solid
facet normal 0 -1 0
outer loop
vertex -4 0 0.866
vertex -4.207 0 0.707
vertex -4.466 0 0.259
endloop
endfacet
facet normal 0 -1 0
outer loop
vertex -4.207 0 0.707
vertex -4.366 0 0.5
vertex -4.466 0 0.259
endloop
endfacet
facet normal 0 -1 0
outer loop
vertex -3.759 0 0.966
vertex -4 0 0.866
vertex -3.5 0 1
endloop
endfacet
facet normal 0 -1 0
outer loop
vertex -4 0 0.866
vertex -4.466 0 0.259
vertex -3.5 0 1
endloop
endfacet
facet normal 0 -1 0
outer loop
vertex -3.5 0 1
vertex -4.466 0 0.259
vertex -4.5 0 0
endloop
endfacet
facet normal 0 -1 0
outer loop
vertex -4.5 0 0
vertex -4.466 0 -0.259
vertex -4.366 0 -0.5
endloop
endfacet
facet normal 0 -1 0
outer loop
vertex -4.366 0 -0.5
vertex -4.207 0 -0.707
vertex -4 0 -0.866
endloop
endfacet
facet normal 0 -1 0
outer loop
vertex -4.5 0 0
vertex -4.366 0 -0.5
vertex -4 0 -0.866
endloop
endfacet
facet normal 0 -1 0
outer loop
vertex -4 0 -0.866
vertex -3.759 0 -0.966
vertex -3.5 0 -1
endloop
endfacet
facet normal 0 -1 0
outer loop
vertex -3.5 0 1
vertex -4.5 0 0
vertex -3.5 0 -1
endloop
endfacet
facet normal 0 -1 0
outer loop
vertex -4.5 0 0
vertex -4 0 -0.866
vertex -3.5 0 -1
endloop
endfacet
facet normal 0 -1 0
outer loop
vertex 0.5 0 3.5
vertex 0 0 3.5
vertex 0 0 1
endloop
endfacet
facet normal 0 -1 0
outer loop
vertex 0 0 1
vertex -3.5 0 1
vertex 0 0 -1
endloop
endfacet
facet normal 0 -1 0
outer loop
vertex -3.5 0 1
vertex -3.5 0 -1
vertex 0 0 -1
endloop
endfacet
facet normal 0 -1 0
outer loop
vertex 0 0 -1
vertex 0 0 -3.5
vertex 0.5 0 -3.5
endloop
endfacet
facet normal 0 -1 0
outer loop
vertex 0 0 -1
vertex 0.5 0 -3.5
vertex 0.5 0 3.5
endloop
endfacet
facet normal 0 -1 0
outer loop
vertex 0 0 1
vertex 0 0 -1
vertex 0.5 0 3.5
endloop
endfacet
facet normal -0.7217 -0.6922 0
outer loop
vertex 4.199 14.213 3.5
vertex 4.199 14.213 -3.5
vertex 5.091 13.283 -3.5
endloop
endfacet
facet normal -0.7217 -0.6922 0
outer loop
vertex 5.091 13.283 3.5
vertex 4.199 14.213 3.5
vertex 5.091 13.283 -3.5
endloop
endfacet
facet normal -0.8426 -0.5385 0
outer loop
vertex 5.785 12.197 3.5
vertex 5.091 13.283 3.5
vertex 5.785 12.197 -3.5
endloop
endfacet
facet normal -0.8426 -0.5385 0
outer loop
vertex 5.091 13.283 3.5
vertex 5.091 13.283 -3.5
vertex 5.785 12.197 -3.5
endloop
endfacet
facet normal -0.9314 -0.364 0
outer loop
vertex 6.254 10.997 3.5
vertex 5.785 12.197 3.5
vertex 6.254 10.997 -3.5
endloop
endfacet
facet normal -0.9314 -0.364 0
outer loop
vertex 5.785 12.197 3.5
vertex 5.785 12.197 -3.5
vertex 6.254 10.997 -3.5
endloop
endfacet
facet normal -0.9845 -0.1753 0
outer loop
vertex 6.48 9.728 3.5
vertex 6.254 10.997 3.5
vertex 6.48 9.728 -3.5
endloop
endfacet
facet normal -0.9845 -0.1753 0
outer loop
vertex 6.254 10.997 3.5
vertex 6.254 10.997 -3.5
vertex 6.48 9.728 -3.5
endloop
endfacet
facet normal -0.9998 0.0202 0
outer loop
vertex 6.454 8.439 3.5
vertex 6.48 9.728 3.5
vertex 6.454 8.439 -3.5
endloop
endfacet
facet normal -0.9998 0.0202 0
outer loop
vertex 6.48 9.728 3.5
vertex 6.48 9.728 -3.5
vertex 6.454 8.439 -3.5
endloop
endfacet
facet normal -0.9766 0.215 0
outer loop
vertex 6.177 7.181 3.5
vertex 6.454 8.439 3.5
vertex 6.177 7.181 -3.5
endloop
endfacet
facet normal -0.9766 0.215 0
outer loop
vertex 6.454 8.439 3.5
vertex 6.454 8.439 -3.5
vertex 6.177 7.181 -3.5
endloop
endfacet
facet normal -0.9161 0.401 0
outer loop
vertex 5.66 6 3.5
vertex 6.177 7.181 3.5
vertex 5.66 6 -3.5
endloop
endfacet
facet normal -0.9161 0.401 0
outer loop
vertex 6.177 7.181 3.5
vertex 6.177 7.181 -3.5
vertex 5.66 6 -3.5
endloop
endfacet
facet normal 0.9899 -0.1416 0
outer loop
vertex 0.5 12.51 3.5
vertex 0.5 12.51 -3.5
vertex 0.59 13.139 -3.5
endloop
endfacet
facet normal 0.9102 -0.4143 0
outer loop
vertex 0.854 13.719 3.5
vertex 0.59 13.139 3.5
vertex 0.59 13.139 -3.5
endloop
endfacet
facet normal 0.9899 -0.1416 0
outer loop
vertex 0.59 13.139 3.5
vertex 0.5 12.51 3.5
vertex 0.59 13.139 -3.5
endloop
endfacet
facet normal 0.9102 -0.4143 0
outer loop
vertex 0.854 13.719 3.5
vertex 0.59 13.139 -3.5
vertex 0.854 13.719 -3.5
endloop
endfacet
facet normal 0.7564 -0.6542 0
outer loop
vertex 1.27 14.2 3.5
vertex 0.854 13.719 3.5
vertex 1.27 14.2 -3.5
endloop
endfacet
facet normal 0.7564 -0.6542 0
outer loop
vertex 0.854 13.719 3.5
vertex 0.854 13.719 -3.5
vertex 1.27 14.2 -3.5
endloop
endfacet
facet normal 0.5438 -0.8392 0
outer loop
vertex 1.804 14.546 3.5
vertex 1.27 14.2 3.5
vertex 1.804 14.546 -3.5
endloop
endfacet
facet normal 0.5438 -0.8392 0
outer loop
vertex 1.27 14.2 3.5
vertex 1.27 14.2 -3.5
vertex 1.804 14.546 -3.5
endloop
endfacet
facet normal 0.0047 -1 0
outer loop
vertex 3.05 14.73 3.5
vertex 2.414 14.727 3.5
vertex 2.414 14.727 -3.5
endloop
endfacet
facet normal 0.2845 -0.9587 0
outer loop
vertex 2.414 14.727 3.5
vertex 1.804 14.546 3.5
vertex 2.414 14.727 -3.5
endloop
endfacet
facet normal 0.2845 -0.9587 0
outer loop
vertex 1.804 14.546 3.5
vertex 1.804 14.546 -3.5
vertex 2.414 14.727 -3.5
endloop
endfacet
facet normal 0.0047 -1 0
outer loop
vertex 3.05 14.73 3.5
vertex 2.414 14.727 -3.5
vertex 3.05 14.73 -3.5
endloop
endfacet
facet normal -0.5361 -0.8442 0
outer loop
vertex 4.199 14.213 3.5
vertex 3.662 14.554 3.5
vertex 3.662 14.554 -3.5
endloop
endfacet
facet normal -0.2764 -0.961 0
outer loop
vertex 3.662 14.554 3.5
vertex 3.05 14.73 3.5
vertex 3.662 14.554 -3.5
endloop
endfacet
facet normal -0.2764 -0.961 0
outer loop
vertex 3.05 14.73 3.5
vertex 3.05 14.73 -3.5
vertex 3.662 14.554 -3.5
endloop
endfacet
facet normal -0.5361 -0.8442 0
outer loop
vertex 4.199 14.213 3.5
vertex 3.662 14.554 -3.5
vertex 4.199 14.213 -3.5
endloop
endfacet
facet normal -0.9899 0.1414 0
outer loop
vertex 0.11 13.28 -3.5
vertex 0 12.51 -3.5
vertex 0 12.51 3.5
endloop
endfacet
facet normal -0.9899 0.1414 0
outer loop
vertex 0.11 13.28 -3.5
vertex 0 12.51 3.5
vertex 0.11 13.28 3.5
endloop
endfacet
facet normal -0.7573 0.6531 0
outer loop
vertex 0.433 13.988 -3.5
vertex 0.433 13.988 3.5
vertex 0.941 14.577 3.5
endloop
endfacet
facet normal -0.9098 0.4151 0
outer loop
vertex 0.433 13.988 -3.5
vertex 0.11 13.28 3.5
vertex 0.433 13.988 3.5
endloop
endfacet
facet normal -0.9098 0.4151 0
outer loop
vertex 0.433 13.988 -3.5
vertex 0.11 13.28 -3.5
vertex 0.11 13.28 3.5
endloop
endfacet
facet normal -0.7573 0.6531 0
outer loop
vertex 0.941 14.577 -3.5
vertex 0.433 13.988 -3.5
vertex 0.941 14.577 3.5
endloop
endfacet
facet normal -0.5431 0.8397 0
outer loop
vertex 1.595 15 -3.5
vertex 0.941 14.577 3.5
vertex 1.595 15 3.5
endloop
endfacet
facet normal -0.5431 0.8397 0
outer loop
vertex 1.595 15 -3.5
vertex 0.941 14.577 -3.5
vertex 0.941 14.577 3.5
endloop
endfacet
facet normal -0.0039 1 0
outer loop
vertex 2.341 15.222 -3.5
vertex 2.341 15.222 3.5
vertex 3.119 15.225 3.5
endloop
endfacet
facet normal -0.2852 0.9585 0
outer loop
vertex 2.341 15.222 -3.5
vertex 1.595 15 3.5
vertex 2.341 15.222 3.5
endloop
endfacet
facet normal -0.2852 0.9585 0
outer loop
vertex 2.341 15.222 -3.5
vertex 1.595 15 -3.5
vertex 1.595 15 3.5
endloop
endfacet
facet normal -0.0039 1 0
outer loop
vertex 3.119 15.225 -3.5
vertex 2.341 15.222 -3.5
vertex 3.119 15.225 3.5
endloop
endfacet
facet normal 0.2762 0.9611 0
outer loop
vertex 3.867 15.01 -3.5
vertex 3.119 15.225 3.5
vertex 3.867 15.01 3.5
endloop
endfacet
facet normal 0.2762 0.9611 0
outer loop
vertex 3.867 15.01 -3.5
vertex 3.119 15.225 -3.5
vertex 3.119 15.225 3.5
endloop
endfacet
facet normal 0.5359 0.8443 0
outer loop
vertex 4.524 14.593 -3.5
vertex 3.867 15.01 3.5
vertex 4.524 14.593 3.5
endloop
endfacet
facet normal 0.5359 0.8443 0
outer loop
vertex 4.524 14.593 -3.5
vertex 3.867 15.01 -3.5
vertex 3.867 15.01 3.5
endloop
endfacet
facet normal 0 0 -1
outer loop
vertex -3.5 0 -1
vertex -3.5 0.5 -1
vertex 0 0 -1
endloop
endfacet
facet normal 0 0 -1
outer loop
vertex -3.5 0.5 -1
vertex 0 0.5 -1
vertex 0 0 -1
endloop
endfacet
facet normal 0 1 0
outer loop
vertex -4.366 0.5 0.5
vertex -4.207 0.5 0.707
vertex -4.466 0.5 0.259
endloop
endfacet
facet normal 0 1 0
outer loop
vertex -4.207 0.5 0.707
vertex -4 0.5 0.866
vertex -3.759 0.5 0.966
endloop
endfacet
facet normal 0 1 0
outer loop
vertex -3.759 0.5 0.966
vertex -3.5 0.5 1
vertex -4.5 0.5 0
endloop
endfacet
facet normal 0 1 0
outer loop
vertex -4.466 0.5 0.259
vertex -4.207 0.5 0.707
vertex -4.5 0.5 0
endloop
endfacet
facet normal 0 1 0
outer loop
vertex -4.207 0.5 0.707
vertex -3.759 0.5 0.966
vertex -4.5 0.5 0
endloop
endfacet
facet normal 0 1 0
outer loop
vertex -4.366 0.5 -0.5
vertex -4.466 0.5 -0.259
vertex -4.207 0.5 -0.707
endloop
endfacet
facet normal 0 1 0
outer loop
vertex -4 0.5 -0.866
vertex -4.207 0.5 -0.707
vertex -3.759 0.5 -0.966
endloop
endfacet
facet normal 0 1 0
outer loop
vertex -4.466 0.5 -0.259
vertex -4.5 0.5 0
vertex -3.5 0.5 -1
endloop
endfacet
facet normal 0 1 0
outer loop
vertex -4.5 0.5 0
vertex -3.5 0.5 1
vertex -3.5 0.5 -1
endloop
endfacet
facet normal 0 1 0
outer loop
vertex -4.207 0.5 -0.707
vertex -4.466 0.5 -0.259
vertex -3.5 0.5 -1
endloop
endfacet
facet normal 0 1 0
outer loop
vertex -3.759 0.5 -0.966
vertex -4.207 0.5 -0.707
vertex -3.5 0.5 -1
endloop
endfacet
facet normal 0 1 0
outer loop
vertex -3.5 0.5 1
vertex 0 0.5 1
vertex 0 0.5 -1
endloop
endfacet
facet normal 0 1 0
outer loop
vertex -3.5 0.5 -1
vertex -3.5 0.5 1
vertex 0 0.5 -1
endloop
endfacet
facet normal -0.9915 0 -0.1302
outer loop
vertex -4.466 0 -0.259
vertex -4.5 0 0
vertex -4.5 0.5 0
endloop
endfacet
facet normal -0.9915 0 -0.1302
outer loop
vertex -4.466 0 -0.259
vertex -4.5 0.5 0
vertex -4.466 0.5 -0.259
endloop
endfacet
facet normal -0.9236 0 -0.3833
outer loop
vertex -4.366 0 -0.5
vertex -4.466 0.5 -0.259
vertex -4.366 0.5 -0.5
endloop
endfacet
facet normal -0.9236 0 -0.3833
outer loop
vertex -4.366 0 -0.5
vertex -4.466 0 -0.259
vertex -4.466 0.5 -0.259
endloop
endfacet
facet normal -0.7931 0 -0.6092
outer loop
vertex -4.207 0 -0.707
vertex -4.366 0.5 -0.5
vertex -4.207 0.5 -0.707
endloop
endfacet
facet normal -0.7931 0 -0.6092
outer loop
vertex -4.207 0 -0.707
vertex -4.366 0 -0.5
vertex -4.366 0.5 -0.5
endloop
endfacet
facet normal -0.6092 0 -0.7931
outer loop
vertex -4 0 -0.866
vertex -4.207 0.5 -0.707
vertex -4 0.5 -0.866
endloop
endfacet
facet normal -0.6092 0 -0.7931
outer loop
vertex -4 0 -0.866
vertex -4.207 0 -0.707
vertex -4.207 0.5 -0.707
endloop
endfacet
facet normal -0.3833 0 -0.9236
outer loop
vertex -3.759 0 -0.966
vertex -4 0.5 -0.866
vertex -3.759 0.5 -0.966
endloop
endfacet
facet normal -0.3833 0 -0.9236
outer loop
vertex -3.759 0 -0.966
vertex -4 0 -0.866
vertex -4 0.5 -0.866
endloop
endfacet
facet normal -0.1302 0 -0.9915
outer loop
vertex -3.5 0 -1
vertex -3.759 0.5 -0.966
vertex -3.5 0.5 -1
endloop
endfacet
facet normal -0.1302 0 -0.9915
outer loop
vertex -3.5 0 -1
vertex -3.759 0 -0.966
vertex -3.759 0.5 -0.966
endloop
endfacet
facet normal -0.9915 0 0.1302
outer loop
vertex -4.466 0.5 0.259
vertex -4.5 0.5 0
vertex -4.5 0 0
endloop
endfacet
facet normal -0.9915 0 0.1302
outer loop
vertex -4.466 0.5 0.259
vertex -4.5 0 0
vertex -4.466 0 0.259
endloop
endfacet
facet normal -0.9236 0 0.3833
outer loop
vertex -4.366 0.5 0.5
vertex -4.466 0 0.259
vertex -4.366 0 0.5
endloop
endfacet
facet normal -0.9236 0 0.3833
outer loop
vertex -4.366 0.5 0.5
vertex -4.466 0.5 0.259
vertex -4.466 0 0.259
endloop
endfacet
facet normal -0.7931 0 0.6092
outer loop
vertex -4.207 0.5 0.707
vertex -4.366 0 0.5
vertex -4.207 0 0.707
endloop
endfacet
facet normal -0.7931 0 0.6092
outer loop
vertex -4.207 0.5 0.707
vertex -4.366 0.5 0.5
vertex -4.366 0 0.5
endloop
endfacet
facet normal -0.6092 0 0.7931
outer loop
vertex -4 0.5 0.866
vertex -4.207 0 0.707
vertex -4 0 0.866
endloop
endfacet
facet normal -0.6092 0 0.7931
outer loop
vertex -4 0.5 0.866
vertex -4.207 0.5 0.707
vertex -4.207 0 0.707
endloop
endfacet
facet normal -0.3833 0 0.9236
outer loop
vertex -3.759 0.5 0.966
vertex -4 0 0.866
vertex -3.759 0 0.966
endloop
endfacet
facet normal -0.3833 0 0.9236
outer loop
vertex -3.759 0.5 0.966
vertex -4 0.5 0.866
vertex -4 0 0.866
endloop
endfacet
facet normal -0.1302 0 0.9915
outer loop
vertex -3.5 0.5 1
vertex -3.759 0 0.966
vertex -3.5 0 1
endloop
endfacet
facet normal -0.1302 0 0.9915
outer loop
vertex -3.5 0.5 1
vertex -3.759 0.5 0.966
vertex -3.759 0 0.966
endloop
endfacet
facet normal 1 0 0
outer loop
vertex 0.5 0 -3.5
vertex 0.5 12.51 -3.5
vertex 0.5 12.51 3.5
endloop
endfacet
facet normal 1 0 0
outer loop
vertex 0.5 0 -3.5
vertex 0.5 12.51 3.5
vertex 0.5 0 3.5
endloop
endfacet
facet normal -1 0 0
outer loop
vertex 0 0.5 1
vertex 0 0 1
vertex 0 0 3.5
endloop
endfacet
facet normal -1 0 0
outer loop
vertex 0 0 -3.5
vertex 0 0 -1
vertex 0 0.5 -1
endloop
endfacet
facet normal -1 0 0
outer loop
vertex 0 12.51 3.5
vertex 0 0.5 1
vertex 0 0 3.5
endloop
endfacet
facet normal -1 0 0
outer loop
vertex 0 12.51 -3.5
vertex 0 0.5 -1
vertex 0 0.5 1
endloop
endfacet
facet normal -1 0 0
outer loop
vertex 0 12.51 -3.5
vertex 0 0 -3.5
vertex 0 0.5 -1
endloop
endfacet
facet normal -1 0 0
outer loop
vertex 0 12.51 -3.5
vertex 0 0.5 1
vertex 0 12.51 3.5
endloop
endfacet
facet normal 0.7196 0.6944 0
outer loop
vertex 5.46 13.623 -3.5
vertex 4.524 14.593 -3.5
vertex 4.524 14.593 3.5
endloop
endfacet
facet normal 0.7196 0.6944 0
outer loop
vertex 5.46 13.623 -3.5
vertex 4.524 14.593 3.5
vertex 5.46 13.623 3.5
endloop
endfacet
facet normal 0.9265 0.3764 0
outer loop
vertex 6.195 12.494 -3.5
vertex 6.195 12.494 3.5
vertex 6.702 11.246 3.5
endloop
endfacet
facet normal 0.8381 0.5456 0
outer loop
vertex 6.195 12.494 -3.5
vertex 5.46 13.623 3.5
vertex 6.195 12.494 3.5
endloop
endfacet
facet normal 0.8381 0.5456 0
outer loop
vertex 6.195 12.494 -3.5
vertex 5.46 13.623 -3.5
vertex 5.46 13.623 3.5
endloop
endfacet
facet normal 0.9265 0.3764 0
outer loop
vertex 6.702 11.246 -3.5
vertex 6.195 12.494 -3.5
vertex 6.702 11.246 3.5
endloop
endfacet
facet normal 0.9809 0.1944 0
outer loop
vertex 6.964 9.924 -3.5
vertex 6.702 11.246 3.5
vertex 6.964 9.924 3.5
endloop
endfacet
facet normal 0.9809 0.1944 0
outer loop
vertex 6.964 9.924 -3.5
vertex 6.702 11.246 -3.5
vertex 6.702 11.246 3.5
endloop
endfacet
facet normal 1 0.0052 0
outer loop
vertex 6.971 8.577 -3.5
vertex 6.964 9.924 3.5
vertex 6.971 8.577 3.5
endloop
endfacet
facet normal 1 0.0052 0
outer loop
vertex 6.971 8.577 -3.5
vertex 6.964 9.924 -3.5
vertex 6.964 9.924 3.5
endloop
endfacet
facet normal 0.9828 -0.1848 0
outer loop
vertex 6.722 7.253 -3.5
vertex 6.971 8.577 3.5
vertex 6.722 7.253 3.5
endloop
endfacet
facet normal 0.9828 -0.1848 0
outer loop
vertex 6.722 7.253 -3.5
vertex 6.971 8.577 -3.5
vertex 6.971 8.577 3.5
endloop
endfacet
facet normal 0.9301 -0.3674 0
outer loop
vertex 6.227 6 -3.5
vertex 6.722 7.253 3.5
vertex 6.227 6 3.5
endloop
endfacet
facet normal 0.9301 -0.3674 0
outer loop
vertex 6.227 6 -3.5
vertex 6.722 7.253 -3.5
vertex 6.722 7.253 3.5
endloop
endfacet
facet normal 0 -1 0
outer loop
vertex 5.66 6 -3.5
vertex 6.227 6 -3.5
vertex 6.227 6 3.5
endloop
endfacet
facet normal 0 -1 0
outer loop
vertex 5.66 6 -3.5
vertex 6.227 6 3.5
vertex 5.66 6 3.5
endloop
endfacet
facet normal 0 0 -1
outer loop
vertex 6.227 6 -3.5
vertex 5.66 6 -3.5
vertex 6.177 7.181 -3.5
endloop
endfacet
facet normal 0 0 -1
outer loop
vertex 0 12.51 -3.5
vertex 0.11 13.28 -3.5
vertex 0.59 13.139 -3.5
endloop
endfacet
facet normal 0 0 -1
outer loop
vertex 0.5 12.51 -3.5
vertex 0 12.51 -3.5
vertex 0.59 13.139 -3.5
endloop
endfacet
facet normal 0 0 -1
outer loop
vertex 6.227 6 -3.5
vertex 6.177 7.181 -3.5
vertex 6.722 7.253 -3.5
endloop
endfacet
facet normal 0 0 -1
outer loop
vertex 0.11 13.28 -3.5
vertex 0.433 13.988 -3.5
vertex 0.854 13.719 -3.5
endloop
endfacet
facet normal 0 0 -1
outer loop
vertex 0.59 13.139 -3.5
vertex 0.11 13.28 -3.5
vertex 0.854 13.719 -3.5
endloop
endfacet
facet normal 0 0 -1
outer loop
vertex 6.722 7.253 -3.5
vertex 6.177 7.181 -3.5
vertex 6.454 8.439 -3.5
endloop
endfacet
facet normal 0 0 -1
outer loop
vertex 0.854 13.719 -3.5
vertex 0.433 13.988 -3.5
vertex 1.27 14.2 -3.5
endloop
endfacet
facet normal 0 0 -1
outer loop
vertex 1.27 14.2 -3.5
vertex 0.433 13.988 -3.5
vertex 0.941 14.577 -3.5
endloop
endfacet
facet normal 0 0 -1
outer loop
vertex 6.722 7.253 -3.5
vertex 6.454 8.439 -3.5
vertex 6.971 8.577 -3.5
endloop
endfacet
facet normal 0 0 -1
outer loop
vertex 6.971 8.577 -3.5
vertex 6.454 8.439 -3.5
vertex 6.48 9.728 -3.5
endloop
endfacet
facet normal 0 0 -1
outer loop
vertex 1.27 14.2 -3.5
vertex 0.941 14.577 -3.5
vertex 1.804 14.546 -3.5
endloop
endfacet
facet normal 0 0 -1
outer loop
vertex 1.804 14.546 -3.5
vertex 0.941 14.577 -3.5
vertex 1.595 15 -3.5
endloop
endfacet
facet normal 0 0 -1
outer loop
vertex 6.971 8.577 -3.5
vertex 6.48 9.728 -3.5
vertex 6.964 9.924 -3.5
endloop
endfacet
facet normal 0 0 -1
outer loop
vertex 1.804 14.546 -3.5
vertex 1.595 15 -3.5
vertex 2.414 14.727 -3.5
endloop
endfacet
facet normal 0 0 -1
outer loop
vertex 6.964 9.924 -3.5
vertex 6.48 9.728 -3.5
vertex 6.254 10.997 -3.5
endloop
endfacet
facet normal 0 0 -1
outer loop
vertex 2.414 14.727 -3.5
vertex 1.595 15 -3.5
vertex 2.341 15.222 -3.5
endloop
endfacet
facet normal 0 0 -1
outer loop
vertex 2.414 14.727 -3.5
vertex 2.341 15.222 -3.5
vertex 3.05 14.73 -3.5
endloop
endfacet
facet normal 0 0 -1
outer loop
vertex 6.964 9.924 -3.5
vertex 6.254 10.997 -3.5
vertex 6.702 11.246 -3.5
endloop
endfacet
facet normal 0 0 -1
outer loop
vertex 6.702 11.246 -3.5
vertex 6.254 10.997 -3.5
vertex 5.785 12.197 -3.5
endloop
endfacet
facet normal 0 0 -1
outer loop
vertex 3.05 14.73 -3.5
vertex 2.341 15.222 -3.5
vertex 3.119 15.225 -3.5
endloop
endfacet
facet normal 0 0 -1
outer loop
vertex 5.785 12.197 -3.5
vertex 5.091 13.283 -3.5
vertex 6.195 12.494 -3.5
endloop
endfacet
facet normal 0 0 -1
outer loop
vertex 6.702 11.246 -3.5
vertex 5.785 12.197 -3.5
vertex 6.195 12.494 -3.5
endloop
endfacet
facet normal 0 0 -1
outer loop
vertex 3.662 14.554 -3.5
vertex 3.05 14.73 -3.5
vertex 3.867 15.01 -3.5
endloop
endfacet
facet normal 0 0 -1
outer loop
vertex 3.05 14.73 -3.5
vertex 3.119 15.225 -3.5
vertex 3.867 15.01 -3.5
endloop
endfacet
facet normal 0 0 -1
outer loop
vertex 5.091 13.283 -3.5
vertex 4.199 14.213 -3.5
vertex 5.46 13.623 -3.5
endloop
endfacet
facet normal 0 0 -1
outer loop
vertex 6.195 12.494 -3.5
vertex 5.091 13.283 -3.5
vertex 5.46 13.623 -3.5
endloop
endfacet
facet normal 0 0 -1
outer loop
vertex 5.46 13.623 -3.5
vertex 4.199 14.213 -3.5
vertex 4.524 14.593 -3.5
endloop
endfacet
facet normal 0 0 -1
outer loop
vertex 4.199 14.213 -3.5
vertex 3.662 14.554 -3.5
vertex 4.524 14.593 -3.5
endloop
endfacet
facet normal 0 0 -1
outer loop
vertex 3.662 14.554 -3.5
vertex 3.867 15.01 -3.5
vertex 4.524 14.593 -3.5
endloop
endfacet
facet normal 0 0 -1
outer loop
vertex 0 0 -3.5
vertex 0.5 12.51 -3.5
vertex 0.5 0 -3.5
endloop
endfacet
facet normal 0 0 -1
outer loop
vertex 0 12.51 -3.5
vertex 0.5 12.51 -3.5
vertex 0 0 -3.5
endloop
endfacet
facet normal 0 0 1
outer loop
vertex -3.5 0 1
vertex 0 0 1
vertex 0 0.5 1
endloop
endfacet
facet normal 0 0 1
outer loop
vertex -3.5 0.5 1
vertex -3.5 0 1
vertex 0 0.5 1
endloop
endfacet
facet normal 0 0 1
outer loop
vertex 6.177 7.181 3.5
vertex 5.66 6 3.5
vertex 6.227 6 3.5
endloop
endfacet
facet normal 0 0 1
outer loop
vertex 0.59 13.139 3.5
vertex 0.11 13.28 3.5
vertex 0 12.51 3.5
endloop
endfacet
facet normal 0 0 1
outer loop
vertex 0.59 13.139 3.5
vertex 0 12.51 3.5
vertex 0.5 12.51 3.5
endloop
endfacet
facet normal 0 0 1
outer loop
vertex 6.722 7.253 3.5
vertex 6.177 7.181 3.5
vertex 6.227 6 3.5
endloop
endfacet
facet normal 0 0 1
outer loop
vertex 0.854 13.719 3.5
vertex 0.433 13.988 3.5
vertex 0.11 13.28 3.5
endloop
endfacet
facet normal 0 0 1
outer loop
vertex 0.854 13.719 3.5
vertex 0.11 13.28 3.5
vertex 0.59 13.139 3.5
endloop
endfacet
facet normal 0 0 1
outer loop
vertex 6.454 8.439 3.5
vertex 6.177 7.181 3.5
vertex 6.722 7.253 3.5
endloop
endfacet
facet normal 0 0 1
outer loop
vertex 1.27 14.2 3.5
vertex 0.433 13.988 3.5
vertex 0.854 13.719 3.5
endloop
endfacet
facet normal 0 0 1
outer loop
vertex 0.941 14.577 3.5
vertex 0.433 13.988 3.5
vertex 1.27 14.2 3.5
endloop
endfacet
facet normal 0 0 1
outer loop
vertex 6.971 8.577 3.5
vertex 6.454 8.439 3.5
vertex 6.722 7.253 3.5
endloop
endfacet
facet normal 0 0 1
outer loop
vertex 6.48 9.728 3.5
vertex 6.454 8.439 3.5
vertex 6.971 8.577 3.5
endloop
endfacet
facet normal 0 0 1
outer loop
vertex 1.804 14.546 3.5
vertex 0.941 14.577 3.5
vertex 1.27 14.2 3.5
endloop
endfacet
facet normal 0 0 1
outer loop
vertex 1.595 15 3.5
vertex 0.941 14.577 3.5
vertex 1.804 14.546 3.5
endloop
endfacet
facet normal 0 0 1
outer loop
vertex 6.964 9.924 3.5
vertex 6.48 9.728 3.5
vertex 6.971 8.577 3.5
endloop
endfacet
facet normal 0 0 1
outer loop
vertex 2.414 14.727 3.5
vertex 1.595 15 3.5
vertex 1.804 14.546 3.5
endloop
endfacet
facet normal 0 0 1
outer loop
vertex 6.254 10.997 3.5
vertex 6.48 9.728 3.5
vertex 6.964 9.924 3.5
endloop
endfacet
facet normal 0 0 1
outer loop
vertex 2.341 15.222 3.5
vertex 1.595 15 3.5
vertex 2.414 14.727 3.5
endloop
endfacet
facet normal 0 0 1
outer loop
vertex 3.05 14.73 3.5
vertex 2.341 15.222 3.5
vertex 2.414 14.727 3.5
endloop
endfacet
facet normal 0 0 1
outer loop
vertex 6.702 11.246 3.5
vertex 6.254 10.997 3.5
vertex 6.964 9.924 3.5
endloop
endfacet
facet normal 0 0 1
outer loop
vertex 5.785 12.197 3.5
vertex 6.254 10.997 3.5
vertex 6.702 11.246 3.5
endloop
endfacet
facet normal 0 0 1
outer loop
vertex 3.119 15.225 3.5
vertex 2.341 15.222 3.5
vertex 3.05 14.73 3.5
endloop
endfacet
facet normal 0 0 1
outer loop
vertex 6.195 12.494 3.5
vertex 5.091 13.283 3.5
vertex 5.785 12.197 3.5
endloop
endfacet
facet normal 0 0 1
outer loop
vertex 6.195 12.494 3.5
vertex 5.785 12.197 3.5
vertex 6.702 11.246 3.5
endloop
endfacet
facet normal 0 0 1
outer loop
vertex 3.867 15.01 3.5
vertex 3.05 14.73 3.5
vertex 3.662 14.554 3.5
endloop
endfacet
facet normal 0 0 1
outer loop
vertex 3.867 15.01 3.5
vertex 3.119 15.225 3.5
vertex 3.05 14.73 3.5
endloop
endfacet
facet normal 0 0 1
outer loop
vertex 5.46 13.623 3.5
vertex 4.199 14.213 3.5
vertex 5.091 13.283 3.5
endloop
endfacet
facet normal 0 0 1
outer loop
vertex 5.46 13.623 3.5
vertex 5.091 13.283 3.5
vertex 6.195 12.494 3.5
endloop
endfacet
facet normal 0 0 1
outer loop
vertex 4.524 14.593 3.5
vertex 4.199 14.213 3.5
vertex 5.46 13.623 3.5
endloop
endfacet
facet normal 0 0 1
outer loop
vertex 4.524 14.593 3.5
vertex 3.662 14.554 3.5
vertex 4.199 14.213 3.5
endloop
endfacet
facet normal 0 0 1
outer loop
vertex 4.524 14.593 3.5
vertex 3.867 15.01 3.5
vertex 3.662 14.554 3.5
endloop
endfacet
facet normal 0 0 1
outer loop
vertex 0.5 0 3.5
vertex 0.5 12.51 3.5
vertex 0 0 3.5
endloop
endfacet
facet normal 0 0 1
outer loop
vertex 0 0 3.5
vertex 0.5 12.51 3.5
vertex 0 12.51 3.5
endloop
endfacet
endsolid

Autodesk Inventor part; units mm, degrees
ref_plane "YZ Plane" through (0, 0, 0) normal (1, 0, 0) x (0, 1, 0)
ref_plane "XZ Plane" through (0, 0, 0) normal (0, 1, 0) x (-1, 0, 0)
ref_plane "XY Plane" through (0, 0, 0) normal (0, 0, 1) x (1, 0, 0)
sketch "Sketch1" plane through (0, 0, 0) normal (0, 0, 1) x (1, 0, 0)
  line L0 (0, 0) -> (0, 12.5096)
  arc A0 (4.5242, 14.5927) -> (0, 12.5096) centre (2.7416, 12.5096) ccw
  arc A1 (6.2274, 6) -> (4.5242, 14.5927) centre (-0.0774, 9.2154) ccw
  line L1 (6.2274, 6) -> (5.6605, 6)
  arc A2 (5.6605, 6) -> (4.1991, 14.2128) centre (-0.0774, 9.2154) ccw
  arc A3 (4.1991, 14.2128) -> (0.5, 12.5096) centre (2.7416, 12.5096) ccw
  line L2 (0.5, 12.5096) -> (0.5, 0)
  line L3 (0, 0) -> (0.5, 0)
  line L4 (7, 9.2154) -> (7, 0)
  point P0 (0.25, 0)
  point P1 (1.595, 15)
  point P2 (5.9439, 6)
  point P3 (6.8649, 10.5915)
  dimension "d0" = 0.5
  dimension "d1" = 15
  dimension "d2" = 6
  dimension "d4" = 7
extrude "Extrusion1" add sketch "Sketch1" along normal mid plane 7
sketch "Sketch2" plane through (0, 0, -3.5) normal (-1, 0, 0) x (0, 0, 1)
  line L0 (2.5, 0) -> (4.5, 0)
  line L1 (4.5, 0) -> (4.5, 0.5)
  line L2 (4.5, 0.5) -> (2.5, 0.5)
  line L3 (2.5, 0.5) -> (2.5, 0)
  line L4 (0, 0) -> (7, 0) projected
  point P0 (3.5, 0.5)
  point P1 (3.5, 0)
  dimension "d8" = 2
extrude "Extrusion2" add sketch "Sketch2" along normal blind 4.5
fillet "Fillet1" radius 1 2 edges at (-4.5, 0.25, 1) (-4.5, 0.25, -1)
properties part number "Holder_Metal"
